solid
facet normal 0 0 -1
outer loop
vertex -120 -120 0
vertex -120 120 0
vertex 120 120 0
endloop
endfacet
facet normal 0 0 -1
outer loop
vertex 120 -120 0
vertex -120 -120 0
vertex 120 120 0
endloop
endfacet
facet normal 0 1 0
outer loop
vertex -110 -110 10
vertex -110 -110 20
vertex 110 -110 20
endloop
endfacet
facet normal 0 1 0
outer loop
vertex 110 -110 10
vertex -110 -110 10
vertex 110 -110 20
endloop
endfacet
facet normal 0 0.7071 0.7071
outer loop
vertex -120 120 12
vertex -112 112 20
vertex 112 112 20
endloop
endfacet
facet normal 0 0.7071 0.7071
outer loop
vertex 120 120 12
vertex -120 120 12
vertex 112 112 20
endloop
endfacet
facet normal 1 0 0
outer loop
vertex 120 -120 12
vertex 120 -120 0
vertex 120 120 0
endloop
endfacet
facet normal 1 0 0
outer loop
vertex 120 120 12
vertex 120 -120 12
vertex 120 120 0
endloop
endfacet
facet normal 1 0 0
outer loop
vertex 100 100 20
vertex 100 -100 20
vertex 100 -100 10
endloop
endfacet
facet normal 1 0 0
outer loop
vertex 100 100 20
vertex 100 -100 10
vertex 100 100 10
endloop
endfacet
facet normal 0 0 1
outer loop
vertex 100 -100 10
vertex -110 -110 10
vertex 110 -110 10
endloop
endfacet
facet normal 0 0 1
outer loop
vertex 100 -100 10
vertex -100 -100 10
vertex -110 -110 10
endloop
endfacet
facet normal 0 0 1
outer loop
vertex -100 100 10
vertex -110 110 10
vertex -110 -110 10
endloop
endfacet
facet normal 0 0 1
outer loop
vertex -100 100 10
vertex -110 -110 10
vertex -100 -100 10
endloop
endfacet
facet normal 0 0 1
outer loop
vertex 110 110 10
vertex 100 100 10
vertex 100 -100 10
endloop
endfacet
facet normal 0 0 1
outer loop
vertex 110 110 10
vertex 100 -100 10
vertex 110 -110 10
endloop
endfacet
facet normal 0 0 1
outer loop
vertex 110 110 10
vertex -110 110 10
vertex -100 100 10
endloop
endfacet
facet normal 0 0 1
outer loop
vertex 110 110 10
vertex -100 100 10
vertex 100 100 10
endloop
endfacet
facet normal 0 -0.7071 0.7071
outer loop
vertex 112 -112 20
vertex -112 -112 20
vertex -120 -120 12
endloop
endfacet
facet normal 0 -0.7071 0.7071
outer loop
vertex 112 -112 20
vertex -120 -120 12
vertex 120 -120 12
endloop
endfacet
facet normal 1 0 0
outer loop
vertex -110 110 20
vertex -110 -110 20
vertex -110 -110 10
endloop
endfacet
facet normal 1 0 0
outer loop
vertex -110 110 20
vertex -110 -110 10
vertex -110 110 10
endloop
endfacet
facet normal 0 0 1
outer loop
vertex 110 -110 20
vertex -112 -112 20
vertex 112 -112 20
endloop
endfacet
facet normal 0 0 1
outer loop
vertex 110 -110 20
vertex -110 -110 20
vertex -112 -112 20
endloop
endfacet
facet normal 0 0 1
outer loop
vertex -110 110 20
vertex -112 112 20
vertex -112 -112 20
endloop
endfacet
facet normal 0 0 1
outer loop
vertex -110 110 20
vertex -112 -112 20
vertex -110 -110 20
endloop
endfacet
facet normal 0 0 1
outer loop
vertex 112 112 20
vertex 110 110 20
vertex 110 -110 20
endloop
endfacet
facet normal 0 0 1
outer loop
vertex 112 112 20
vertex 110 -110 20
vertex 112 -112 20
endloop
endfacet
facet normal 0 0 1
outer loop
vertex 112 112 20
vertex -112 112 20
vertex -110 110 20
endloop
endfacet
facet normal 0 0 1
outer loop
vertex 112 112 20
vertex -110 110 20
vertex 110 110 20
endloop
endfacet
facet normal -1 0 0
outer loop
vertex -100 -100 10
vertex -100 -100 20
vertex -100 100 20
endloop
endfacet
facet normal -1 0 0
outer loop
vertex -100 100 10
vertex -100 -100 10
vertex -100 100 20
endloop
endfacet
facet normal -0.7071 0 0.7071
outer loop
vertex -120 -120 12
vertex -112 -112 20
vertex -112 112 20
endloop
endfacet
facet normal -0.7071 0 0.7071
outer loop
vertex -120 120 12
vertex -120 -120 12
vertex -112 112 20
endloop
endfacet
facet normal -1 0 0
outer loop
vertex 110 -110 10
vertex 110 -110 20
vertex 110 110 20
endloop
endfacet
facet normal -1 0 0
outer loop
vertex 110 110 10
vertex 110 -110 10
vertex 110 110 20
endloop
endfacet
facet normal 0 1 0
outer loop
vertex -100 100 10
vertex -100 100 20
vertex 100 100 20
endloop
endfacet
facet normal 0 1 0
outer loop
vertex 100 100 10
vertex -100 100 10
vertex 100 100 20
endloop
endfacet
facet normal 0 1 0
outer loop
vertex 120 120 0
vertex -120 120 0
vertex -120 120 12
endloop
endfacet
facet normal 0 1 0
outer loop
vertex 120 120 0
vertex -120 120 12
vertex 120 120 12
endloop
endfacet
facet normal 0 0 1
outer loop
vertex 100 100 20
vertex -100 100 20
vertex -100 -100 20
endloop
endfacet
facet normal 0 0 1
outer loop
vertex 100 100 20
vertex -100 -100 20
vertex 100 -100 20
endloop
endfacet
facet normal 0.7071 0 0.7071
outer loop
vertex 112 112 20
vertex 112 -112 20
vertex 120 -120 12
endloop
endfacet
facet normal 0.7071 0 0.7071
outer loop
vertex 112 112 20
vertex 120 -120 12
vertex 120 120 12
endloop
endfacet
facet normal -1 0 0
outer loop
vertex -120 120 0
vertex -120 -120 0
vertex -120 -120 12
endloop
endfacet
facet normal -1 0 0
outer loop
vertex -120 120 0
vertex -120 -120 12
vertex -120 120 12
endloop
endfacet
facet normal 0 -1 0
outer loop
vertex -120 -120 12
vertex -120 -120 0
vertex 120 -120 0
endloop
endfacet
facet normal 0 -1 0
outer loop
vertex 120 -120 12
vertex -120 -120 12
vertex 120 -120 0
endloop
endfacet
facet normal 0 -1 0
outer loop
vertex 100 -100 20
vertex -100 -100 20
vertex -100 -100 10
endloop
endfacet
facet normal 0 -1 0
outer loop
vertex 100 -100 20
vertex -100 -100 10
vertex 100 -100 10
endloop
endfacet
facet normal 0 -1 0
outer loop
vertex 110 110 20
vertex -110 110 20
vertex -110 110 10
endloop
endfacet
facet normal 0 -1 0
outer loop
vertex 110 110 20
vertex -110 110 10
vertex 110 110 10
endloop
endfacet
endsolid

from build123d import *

# Parameters (mm, degrees)
SKETCH_1_W          = 240
SKETCH_1_H          = 240
EXTRUDE_1_DEPTH     = 20
CHAMFER_1_SIZE      = 8
SKETCH_2_W          = 220
SKETCH_2_H          = 220
SKETCH_2_W_2        = 200
SKETCH_2_H_2        = 200
CUT_EXTRUDE_1_DEPTH = 10


with BuildPart() as part:
    # Эскиз1 → Бобышка-Вытянуть1 (new body)
    with BuildSketch(Plane.XY):
        Rectangle(SKETCH_1_W, SKETCH_1_H)
    extrude(amount=EXTRUDE_1_DEPTH)

    # Фаска1
    chamfer_1_edges = [part.edges().sort_by_distance(p)[0] for p in [
        (0, -120, 20),
        (-120, 0, 20),
        (0, 120, 20),
        (120, 0, 20),
    ]]
    chamfer(chamfer_1_edges, length=CHAMFER_1_SIZE)

    # Эскиз2 → Вырез-Вытянуть1 (cut)
    with BuildSketch(Plane.XY.offset(20)):
        Rectangle(SKETCH_2_W, SKETCH_2_H)
        Rectangle(SKETCH_2_W_2, SKETCH_2_H_2, mode=Mode.SUBTRACT)
    extrude(amount=-CUT_EXTRUDE_1_DEPTH, mode=Mode.SUBTRACT)


solid = part.part
